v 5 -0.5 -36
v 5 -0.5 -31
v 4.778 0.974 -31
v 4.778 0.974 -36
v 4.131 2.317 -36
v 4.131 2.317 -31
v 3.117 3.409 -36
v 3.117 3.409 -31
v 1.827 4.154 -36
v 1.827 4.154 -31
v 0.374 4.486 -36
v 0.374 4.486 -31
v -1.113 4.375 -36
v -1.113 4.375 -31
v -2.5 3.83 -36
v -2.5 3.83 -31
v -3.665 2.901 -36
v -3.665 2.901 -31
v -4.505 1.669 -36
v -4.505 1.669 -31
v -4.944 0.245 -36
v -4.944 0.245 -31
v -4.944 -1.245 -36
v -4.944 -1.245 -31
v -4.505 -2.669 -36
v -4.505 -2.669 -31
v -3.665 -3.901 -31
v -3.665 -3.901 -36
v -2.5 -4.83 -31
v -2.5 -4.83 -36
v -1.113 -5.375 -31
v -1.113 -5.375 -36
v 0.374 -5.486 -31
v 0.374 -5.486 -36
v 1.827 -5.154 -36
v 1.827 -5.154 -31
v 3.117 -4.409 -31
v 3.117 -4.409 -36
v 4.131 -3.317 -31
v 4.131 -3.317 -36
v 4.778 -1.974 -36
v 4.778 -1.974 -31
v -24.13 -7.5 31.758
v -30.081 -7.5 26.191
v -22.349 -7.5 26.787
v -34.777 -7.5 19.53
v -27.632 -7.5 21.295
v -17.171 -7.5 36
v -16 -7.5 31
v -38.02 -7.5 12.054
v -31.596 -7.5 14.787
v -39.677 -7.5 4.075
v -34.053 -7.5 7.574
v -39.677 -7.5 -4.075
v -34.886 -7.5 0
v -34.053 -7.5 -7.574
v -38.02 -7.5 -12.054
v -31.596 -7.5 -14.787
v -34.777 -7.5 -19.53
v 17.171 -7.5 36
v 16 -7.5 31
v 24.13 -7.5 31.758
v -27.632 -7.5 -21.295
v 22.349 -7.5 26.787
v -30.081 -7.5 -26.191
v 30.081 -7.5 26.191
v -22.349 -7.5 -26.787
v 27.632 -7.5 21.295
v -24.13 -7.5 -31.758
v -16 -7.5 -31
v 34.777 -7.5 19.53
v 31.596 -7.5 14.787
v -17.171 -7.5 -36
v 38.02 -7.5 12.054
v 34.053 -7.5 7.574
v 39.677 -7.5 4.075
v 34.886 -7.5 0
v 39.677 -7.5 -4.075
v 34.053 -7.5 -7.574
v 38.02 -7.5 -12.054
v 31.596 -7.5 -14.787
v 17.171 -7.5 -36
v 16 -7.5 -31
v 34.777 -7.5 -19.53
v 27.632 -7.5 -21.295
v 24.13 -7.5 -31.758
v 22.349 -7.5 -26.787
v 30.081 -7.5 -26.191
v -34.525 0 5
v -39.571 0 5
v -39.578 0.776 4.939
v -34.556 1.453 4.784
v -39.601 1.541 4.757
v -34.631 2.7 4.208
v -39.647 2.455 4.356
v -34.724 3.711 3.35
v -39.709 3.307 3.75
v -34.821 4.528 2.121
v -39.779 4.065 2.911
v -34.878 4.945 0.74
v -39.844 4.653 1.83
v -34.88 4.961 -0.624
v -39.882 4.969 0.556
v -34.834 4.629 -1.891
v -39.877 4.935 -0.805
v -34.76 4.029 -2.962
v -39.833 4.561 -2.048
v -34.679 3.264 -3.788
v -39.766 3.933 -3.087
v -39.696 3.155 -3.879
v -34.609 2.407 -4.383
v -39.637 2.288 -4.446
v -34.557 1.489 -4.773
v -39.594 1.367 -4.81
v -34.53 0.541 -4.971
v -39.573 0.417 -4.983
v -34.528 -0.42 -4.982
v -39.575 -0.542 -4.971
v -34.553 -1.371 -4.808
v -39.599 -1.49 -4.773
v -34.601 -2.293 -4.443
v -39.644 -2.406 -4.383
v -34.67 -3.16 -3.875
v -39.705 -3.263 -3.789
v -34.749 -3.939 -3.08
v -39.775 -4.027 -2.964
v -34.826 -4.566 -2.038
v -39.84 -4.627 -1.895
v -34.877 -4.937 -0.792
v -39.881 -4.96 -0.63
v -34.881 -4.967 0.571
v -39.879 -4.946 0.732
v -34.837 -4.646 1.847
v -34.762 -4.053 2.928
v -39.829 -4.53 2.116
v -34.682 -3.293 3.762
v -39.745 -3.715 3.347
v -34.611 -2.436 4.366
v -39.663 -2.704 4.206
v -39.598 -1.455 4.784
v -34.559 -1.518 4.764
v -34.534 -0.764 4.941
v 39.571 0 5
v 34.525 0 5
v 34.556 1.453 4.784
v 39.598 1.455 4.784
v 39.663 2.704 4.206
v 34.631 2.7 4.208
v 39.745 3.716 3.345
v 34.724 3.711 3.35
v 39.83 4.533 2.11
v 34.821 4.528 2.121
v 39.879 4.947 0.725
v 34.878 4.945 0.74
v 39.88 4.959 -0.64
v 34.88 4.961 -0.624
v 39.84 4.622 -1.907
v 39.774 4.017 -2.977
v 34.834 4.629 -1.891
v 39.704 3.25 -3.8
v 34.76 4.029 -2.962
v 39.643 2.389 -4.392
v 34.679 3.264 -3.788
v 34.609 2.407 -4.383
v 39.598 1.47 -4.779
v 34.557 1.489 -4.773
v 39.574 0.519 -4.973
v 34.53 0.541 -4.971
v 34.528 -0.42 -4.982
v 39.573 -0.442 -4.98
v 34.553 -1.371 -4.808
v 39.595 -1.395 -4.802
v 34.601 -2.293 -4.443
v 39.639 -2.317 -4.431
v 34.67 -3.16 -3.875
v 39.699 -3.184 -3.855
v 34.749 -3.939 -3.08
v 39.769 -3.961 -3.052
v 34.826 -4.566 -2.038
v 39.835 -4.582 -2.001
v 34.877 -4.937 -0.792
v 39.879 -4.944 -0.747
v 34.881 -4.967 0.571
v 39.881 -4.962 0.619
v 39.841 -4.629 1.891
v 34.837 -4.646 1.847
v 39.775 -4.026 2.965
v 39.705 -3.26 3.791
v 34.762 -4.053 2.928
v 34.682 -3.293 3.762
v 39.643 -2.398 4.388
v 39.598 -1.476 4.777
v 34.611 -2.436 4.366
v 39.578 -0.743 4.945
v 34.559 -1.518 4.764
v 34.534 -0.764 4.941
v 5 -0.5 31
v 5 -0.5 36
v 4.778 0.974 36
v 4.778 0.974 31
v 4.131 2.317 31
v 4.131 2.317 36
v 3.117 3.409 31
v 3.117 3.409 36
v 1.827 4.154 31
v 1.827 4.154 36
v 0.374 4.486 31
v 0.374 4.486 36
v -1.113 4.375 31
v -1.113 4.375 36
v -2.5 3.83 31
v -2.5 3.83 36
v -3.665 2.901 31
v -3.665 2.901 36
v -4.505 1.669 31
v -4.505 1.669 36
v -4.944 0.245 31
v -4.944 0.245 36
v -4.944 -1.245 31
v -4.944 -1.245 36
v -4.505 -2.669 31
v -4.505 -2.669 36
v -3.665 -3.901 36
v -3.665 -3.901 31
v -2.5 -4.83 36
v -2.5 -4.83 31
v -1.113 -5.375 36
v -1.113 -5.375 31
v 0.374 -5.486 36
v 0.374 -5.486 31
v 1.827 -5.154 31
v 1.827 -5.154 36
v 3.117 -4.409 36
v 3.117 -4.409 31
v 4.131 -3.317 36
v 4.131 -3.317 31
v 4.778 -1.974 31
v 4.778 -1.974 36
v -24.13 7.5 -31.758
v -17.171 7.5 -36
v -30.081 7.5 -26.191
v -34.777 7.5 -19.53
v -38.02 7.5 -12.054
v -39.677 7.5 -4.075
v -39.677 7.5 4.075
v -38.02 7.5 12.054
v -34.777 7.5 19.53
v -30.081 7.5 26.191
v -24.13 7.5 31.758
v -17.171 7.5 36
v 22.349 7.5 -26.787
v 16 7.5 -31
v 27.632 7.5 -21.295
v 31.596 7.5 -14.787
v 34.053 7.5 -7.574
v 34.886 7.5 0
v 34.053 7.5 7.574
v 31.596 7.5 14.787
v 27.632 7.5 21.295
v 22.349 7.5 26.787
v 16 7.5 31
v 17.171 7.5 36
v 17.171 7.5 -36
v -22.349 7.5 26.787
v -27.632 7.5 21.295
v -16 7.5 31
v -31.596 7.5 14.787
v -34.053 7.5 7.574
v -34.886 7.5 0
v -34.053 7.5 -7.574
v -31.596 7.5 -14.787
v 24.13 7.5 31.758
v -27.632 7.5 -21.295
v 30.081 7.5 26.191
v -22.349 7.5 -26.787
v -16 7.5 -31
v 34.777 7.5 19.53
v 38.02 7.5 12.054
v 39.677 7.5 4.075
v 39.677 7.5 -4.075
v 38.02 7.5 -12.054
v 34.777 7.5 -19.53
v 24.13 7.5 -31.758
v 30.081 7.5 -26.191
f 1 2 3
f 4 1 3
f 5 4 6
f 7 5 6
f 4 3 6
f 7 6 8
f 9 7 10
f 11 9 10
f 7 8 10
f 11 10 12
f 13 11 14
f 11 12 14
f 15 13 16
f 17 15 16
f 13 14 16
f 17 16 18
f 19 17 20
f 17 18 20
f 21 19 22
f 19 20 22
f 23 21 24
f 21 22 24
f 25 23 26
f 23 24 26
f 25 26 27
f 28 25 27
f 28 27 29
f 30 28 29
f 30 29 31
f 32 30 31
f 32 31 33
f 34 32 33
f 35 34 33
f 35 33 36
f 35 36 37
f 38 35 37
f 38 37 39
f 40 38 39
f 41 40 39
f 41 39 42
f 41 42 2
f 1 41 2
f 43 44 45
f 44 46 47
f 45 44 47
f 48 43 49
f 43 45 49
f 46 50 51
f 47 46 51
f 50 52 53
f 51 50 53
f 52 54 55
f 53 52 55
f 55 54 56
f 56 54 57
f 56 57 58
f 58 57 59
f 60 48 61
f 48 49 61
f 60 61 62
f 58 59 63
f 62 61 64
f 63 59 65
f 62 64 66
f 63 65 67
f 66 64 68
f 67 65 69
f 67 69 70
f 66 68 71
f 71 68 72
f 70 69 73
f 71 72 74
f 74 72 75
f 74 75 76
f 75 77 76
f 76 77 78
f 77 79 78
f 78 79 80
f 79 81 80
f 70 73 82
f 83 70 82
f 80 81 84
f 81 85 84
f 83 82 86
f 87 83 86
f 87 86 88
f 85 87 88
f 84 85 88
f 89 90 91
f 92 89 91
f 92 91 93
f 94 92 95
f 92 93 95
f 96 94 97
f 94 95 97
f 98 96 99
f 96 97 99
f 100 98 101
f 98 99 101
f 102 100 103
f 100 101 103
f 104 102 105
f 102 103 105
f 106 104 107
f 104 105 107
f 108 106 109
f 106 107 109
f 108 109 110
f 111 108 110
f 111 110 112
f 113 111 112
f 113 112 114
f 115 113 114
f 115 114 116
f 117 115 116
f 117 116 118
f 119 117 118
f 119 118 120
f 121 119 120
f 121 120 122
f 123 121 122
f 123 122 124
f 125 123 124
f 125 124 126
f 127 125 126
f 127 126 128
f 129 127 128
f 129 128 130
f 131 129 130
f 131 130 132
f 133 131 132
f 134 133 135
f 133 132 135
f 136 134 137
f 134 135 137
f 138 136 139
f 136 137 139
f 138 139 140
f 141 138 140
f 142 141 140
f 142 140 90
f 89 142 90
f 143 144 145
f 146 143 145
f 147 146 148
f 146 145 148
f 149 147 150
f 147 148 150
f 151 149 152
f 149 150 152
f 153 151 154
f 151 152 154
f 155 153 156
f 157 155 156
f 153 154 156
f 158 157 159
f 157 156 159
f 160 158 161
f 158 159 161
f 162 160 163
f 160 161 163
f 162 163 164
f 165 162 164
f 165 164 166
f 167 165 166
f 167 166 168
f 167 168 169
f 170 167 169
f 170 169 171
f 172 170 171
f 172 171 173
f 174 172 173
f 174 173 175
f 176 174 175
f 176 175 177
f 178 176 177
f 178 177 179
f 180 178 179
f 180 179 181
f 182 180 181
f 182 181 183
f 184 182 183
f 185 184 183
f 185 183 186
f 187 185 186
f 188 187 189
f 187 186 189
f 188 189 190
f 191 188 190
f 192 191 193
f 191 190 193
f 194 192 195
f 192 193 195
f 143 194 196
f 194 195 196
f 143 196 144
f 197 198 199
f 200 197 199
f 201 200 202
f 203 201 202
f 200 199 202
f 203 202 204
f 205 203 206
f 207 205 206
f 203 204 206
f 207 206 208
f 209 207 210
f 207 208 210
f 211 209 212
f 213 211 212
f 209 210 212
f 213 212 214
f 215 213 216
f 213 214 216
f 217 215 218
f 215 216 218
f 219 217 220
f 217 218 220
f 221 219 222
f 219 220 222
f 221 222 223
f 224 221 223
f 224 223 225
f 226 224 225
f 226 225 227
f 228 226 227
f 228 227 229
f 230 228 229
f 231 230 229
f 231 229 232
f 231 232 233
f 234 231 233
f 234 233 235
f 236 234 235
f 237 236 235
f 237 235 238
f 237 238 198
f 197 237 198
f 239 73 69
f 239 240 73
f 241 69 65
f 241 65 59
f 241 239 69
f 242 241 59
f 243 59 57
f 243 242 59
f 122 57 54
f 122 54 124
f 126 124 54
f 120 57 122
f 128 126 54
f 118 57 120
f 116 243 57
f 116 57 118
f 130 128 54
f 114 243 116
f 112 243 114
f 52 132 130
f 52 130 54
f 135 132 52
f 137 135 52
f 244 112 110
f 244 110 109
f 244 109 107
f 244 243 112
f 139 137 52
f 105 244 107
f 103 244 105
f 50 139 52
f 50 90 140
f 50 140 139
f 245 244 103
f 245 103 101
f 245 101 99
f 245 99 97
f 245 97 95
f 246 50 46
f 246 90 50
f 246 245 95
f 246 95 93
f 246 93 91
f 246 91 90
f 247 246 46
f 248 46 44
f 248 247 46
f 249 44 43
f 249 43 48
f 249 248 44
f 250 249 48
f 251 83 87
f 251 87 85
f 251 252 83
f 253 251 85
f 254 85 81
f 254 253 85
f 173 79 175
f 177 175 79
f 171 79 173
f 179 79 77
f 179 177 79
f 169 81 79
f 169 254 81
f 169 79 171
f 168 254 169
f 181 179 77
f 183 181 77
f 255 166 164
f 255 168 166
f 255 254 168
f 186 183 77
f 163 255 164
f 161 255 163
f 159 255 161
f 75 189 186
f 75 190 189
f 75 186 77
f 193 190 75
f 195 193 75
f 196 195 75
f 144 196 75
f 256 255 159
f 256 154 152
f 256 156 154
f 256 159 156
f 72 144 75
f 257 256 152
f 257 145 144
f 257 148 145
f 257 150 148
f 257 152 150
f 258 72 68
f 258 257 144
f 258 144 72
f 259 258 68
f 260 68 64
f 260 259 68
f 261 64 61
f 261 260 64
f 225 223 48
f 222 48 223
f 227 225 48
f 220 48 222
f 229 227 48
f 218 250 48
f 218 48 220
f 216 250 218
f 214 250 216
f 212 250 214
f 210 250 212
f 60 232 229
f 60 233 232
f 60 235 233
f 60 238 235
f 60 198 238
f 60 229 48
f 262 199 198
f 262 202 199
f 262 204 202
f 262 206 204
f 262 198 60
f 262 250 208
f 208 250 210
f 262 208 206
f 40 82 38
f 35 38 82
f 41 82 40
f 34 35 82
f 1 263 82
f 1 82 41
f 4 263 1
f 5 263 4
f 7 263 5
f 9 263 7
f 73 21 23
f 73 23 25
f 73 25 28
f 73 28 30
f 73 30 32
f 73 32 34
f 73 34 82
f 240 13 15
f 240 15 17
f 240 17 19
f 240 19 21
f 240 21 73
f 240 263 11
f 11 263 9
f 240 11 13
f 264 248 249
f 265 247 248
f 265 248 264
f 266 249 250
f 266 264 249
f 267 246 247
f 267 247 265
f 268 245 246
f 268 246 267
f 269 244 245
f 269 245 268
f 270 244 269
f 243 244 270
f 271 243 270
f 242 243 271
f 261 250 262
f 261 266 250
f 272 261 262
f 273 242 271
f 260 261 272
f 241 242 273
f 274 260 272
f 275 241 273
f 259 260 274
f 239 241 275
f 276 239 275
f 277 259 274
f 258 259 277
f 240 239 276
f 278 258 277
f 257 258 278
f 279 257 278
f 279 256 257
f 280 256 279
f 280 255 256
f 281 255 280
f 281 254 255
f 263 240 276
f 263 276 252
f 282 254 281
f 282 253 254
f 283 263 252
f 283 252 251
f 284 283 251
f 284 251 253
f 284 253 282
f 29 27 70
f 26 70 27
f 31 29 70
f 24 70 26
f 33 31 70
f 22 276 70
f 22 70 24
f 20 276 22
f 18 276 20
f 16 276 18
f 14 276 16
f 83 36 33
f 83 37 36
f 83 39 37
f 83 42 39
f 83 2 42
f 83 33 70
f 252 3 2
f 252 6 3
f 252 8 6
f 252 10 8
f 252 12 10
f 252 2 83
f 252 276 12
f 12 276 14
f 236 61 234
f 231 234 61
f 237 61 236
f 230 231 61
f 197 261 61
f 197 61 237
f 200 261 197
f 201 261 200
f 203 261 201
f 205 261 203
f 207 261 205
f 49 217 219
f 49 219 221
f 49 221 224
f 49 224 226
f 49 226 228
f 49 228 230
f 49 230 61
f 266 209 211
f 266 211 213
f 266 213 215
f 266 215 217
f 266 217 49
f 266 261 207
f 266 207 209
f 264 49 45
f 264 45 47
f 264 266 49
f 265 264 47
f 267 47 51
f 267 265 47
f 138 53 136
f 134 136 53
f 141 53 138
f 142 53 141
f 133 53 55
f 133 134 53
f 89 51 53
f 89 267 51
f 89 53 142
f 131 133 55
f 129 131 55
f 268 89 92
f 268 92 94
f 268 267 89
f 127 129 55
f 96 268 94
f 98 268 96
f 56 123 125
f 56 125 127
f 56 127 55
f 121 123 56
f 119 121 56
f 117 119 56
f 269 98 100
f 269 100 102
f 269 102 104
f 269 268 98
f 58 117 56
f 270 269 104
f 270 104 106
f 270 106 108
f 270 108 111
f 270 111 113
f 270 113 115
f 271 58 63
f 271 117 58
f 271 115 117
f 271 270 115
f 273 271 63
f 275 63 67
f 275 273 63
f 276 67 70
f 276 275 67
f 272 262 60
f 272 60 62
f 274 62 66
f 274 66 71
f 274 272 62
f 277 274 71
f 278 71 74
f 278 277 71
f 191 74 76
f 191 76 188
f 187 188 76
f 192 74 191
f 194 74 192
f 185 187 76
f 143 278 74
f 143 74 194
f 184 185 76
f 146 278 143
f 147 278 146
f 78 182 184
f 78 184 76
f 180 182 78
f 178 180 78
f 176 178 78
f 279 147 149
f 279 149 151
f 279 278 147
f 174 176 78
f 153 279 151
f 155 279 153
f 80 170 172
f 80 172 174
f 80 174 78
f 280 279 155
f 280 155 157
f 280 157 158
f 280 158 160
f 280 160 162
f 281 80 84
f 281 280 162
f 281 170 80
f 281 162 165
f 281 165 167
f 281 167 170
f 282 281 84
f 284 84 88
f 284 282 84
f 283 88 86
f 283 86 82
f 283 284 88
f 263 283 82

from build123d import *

# Parameters (mm, degrees)
BOSS_EXTRUDE1_DEPTH     = 7.5
CUT_EXTRUDE1_REACH      = 84.651
SKETCH2_R               = 5
CUT_EXTRUDE2_REACH      = 89.839
CUT_EXTRUDE2_END_RADIUS = 39.885527085
SKETCH3_R               = 5


with BuildPart() as part:
    # Sketch1 → Boss-Extrude1 (new, symmetric)
    with BuildSketch(Plane(origin=(0, 0, 0), x_dir=(1, 0, 0), z_dir=(0, 1, 0))):
        with BuildLine():
            Line((-17.171350292, -36), (17.171350292, -36))
            ThreePointArc((17.171350292, -36), (39.885527085, 0), (17.171350292, 36))
            Line((17.171350292, 36), (-17.171350292, 36))
            ThreePointArc((-17.171350292, 36), (-39.885527085, 0), (-17.171350292, -36))
        make_face()
        with BuildLine():
            Line((-16, 31), (16, 31))
            ThreePointArc((16, 31), (34.885527085, 0), (16, -31))
            Line((16, -31), (-16, -31))
            ThreePointArc((-16, -31), (-34.885527085, 0), (-16, 31))
        make_face(mode=Mode.SUBTRACT)
    extrude(amount=BOSS_EXTRUDE1_DEPTH, both=True)

    # Cut-Extrude1: up to this face of the body (flat: up to its plane)
    cut_extrude1_end = Plane(part.part.faces().sort_by_distance((0, 0, -36))[0])
    # Sketch2 → Cut-Extrude1 (cut, up to the picked face)
    with BuildSketch(Plane.XY.offset(36), mode=Mode.PRIVATE) as cut_extrude1_sk1:
        with Locations((0, -0.5)):
            Circle(SKETCH2_R)
    cut_extrude1_tool1 = split(extrude(cut_extrude1_sk1.sketch, amount=-CUT_EXTRUDE1_REACH, mode=Mode.PRIVATE), bisect_by=cut_extrude1_end, keep=Keep.BOTH, mode=Mode.PRIVATE)
    add(cut_extrude1_tool1.solids().sort_by(Axis((0, -0.5, 36), (0, 0, -1)))[0], mode=Mode.SUBTRACT)

    # Cut-Extrude2: up to this cylinder (the profile starts inside it)
    cut_extrude2_end = Plane(origin=(0, 0, 0), z_dir=(0, -1, 0)) * Cylinder(CUT_EXTRUDE2_END_RADIUS, 260.44905417, mode=Mode.PRIVATE)
    # Sketch3 → Cut-Extrude2 (cut, up to the surface)
    with BuildSketch(Plane.ZY.offset(39.885527085), mode=Mode.PRIVATE) as cut_extrude2_sk1:
        Circle(SKETCH3_R)
    cut_extrude2_tool1 = extrude(cut_extrude2_sk1.sketch, amount=-CUT_EXTRUDE2_REACH, mode=Mode.PRIVATE) & cut_extrude2_end
    add(cut_extrude2_tool1.solids().sort_by_distance((-39.885527, 0, 0))[0], mode=Mode.SUBTRACT)


solid = part.part
